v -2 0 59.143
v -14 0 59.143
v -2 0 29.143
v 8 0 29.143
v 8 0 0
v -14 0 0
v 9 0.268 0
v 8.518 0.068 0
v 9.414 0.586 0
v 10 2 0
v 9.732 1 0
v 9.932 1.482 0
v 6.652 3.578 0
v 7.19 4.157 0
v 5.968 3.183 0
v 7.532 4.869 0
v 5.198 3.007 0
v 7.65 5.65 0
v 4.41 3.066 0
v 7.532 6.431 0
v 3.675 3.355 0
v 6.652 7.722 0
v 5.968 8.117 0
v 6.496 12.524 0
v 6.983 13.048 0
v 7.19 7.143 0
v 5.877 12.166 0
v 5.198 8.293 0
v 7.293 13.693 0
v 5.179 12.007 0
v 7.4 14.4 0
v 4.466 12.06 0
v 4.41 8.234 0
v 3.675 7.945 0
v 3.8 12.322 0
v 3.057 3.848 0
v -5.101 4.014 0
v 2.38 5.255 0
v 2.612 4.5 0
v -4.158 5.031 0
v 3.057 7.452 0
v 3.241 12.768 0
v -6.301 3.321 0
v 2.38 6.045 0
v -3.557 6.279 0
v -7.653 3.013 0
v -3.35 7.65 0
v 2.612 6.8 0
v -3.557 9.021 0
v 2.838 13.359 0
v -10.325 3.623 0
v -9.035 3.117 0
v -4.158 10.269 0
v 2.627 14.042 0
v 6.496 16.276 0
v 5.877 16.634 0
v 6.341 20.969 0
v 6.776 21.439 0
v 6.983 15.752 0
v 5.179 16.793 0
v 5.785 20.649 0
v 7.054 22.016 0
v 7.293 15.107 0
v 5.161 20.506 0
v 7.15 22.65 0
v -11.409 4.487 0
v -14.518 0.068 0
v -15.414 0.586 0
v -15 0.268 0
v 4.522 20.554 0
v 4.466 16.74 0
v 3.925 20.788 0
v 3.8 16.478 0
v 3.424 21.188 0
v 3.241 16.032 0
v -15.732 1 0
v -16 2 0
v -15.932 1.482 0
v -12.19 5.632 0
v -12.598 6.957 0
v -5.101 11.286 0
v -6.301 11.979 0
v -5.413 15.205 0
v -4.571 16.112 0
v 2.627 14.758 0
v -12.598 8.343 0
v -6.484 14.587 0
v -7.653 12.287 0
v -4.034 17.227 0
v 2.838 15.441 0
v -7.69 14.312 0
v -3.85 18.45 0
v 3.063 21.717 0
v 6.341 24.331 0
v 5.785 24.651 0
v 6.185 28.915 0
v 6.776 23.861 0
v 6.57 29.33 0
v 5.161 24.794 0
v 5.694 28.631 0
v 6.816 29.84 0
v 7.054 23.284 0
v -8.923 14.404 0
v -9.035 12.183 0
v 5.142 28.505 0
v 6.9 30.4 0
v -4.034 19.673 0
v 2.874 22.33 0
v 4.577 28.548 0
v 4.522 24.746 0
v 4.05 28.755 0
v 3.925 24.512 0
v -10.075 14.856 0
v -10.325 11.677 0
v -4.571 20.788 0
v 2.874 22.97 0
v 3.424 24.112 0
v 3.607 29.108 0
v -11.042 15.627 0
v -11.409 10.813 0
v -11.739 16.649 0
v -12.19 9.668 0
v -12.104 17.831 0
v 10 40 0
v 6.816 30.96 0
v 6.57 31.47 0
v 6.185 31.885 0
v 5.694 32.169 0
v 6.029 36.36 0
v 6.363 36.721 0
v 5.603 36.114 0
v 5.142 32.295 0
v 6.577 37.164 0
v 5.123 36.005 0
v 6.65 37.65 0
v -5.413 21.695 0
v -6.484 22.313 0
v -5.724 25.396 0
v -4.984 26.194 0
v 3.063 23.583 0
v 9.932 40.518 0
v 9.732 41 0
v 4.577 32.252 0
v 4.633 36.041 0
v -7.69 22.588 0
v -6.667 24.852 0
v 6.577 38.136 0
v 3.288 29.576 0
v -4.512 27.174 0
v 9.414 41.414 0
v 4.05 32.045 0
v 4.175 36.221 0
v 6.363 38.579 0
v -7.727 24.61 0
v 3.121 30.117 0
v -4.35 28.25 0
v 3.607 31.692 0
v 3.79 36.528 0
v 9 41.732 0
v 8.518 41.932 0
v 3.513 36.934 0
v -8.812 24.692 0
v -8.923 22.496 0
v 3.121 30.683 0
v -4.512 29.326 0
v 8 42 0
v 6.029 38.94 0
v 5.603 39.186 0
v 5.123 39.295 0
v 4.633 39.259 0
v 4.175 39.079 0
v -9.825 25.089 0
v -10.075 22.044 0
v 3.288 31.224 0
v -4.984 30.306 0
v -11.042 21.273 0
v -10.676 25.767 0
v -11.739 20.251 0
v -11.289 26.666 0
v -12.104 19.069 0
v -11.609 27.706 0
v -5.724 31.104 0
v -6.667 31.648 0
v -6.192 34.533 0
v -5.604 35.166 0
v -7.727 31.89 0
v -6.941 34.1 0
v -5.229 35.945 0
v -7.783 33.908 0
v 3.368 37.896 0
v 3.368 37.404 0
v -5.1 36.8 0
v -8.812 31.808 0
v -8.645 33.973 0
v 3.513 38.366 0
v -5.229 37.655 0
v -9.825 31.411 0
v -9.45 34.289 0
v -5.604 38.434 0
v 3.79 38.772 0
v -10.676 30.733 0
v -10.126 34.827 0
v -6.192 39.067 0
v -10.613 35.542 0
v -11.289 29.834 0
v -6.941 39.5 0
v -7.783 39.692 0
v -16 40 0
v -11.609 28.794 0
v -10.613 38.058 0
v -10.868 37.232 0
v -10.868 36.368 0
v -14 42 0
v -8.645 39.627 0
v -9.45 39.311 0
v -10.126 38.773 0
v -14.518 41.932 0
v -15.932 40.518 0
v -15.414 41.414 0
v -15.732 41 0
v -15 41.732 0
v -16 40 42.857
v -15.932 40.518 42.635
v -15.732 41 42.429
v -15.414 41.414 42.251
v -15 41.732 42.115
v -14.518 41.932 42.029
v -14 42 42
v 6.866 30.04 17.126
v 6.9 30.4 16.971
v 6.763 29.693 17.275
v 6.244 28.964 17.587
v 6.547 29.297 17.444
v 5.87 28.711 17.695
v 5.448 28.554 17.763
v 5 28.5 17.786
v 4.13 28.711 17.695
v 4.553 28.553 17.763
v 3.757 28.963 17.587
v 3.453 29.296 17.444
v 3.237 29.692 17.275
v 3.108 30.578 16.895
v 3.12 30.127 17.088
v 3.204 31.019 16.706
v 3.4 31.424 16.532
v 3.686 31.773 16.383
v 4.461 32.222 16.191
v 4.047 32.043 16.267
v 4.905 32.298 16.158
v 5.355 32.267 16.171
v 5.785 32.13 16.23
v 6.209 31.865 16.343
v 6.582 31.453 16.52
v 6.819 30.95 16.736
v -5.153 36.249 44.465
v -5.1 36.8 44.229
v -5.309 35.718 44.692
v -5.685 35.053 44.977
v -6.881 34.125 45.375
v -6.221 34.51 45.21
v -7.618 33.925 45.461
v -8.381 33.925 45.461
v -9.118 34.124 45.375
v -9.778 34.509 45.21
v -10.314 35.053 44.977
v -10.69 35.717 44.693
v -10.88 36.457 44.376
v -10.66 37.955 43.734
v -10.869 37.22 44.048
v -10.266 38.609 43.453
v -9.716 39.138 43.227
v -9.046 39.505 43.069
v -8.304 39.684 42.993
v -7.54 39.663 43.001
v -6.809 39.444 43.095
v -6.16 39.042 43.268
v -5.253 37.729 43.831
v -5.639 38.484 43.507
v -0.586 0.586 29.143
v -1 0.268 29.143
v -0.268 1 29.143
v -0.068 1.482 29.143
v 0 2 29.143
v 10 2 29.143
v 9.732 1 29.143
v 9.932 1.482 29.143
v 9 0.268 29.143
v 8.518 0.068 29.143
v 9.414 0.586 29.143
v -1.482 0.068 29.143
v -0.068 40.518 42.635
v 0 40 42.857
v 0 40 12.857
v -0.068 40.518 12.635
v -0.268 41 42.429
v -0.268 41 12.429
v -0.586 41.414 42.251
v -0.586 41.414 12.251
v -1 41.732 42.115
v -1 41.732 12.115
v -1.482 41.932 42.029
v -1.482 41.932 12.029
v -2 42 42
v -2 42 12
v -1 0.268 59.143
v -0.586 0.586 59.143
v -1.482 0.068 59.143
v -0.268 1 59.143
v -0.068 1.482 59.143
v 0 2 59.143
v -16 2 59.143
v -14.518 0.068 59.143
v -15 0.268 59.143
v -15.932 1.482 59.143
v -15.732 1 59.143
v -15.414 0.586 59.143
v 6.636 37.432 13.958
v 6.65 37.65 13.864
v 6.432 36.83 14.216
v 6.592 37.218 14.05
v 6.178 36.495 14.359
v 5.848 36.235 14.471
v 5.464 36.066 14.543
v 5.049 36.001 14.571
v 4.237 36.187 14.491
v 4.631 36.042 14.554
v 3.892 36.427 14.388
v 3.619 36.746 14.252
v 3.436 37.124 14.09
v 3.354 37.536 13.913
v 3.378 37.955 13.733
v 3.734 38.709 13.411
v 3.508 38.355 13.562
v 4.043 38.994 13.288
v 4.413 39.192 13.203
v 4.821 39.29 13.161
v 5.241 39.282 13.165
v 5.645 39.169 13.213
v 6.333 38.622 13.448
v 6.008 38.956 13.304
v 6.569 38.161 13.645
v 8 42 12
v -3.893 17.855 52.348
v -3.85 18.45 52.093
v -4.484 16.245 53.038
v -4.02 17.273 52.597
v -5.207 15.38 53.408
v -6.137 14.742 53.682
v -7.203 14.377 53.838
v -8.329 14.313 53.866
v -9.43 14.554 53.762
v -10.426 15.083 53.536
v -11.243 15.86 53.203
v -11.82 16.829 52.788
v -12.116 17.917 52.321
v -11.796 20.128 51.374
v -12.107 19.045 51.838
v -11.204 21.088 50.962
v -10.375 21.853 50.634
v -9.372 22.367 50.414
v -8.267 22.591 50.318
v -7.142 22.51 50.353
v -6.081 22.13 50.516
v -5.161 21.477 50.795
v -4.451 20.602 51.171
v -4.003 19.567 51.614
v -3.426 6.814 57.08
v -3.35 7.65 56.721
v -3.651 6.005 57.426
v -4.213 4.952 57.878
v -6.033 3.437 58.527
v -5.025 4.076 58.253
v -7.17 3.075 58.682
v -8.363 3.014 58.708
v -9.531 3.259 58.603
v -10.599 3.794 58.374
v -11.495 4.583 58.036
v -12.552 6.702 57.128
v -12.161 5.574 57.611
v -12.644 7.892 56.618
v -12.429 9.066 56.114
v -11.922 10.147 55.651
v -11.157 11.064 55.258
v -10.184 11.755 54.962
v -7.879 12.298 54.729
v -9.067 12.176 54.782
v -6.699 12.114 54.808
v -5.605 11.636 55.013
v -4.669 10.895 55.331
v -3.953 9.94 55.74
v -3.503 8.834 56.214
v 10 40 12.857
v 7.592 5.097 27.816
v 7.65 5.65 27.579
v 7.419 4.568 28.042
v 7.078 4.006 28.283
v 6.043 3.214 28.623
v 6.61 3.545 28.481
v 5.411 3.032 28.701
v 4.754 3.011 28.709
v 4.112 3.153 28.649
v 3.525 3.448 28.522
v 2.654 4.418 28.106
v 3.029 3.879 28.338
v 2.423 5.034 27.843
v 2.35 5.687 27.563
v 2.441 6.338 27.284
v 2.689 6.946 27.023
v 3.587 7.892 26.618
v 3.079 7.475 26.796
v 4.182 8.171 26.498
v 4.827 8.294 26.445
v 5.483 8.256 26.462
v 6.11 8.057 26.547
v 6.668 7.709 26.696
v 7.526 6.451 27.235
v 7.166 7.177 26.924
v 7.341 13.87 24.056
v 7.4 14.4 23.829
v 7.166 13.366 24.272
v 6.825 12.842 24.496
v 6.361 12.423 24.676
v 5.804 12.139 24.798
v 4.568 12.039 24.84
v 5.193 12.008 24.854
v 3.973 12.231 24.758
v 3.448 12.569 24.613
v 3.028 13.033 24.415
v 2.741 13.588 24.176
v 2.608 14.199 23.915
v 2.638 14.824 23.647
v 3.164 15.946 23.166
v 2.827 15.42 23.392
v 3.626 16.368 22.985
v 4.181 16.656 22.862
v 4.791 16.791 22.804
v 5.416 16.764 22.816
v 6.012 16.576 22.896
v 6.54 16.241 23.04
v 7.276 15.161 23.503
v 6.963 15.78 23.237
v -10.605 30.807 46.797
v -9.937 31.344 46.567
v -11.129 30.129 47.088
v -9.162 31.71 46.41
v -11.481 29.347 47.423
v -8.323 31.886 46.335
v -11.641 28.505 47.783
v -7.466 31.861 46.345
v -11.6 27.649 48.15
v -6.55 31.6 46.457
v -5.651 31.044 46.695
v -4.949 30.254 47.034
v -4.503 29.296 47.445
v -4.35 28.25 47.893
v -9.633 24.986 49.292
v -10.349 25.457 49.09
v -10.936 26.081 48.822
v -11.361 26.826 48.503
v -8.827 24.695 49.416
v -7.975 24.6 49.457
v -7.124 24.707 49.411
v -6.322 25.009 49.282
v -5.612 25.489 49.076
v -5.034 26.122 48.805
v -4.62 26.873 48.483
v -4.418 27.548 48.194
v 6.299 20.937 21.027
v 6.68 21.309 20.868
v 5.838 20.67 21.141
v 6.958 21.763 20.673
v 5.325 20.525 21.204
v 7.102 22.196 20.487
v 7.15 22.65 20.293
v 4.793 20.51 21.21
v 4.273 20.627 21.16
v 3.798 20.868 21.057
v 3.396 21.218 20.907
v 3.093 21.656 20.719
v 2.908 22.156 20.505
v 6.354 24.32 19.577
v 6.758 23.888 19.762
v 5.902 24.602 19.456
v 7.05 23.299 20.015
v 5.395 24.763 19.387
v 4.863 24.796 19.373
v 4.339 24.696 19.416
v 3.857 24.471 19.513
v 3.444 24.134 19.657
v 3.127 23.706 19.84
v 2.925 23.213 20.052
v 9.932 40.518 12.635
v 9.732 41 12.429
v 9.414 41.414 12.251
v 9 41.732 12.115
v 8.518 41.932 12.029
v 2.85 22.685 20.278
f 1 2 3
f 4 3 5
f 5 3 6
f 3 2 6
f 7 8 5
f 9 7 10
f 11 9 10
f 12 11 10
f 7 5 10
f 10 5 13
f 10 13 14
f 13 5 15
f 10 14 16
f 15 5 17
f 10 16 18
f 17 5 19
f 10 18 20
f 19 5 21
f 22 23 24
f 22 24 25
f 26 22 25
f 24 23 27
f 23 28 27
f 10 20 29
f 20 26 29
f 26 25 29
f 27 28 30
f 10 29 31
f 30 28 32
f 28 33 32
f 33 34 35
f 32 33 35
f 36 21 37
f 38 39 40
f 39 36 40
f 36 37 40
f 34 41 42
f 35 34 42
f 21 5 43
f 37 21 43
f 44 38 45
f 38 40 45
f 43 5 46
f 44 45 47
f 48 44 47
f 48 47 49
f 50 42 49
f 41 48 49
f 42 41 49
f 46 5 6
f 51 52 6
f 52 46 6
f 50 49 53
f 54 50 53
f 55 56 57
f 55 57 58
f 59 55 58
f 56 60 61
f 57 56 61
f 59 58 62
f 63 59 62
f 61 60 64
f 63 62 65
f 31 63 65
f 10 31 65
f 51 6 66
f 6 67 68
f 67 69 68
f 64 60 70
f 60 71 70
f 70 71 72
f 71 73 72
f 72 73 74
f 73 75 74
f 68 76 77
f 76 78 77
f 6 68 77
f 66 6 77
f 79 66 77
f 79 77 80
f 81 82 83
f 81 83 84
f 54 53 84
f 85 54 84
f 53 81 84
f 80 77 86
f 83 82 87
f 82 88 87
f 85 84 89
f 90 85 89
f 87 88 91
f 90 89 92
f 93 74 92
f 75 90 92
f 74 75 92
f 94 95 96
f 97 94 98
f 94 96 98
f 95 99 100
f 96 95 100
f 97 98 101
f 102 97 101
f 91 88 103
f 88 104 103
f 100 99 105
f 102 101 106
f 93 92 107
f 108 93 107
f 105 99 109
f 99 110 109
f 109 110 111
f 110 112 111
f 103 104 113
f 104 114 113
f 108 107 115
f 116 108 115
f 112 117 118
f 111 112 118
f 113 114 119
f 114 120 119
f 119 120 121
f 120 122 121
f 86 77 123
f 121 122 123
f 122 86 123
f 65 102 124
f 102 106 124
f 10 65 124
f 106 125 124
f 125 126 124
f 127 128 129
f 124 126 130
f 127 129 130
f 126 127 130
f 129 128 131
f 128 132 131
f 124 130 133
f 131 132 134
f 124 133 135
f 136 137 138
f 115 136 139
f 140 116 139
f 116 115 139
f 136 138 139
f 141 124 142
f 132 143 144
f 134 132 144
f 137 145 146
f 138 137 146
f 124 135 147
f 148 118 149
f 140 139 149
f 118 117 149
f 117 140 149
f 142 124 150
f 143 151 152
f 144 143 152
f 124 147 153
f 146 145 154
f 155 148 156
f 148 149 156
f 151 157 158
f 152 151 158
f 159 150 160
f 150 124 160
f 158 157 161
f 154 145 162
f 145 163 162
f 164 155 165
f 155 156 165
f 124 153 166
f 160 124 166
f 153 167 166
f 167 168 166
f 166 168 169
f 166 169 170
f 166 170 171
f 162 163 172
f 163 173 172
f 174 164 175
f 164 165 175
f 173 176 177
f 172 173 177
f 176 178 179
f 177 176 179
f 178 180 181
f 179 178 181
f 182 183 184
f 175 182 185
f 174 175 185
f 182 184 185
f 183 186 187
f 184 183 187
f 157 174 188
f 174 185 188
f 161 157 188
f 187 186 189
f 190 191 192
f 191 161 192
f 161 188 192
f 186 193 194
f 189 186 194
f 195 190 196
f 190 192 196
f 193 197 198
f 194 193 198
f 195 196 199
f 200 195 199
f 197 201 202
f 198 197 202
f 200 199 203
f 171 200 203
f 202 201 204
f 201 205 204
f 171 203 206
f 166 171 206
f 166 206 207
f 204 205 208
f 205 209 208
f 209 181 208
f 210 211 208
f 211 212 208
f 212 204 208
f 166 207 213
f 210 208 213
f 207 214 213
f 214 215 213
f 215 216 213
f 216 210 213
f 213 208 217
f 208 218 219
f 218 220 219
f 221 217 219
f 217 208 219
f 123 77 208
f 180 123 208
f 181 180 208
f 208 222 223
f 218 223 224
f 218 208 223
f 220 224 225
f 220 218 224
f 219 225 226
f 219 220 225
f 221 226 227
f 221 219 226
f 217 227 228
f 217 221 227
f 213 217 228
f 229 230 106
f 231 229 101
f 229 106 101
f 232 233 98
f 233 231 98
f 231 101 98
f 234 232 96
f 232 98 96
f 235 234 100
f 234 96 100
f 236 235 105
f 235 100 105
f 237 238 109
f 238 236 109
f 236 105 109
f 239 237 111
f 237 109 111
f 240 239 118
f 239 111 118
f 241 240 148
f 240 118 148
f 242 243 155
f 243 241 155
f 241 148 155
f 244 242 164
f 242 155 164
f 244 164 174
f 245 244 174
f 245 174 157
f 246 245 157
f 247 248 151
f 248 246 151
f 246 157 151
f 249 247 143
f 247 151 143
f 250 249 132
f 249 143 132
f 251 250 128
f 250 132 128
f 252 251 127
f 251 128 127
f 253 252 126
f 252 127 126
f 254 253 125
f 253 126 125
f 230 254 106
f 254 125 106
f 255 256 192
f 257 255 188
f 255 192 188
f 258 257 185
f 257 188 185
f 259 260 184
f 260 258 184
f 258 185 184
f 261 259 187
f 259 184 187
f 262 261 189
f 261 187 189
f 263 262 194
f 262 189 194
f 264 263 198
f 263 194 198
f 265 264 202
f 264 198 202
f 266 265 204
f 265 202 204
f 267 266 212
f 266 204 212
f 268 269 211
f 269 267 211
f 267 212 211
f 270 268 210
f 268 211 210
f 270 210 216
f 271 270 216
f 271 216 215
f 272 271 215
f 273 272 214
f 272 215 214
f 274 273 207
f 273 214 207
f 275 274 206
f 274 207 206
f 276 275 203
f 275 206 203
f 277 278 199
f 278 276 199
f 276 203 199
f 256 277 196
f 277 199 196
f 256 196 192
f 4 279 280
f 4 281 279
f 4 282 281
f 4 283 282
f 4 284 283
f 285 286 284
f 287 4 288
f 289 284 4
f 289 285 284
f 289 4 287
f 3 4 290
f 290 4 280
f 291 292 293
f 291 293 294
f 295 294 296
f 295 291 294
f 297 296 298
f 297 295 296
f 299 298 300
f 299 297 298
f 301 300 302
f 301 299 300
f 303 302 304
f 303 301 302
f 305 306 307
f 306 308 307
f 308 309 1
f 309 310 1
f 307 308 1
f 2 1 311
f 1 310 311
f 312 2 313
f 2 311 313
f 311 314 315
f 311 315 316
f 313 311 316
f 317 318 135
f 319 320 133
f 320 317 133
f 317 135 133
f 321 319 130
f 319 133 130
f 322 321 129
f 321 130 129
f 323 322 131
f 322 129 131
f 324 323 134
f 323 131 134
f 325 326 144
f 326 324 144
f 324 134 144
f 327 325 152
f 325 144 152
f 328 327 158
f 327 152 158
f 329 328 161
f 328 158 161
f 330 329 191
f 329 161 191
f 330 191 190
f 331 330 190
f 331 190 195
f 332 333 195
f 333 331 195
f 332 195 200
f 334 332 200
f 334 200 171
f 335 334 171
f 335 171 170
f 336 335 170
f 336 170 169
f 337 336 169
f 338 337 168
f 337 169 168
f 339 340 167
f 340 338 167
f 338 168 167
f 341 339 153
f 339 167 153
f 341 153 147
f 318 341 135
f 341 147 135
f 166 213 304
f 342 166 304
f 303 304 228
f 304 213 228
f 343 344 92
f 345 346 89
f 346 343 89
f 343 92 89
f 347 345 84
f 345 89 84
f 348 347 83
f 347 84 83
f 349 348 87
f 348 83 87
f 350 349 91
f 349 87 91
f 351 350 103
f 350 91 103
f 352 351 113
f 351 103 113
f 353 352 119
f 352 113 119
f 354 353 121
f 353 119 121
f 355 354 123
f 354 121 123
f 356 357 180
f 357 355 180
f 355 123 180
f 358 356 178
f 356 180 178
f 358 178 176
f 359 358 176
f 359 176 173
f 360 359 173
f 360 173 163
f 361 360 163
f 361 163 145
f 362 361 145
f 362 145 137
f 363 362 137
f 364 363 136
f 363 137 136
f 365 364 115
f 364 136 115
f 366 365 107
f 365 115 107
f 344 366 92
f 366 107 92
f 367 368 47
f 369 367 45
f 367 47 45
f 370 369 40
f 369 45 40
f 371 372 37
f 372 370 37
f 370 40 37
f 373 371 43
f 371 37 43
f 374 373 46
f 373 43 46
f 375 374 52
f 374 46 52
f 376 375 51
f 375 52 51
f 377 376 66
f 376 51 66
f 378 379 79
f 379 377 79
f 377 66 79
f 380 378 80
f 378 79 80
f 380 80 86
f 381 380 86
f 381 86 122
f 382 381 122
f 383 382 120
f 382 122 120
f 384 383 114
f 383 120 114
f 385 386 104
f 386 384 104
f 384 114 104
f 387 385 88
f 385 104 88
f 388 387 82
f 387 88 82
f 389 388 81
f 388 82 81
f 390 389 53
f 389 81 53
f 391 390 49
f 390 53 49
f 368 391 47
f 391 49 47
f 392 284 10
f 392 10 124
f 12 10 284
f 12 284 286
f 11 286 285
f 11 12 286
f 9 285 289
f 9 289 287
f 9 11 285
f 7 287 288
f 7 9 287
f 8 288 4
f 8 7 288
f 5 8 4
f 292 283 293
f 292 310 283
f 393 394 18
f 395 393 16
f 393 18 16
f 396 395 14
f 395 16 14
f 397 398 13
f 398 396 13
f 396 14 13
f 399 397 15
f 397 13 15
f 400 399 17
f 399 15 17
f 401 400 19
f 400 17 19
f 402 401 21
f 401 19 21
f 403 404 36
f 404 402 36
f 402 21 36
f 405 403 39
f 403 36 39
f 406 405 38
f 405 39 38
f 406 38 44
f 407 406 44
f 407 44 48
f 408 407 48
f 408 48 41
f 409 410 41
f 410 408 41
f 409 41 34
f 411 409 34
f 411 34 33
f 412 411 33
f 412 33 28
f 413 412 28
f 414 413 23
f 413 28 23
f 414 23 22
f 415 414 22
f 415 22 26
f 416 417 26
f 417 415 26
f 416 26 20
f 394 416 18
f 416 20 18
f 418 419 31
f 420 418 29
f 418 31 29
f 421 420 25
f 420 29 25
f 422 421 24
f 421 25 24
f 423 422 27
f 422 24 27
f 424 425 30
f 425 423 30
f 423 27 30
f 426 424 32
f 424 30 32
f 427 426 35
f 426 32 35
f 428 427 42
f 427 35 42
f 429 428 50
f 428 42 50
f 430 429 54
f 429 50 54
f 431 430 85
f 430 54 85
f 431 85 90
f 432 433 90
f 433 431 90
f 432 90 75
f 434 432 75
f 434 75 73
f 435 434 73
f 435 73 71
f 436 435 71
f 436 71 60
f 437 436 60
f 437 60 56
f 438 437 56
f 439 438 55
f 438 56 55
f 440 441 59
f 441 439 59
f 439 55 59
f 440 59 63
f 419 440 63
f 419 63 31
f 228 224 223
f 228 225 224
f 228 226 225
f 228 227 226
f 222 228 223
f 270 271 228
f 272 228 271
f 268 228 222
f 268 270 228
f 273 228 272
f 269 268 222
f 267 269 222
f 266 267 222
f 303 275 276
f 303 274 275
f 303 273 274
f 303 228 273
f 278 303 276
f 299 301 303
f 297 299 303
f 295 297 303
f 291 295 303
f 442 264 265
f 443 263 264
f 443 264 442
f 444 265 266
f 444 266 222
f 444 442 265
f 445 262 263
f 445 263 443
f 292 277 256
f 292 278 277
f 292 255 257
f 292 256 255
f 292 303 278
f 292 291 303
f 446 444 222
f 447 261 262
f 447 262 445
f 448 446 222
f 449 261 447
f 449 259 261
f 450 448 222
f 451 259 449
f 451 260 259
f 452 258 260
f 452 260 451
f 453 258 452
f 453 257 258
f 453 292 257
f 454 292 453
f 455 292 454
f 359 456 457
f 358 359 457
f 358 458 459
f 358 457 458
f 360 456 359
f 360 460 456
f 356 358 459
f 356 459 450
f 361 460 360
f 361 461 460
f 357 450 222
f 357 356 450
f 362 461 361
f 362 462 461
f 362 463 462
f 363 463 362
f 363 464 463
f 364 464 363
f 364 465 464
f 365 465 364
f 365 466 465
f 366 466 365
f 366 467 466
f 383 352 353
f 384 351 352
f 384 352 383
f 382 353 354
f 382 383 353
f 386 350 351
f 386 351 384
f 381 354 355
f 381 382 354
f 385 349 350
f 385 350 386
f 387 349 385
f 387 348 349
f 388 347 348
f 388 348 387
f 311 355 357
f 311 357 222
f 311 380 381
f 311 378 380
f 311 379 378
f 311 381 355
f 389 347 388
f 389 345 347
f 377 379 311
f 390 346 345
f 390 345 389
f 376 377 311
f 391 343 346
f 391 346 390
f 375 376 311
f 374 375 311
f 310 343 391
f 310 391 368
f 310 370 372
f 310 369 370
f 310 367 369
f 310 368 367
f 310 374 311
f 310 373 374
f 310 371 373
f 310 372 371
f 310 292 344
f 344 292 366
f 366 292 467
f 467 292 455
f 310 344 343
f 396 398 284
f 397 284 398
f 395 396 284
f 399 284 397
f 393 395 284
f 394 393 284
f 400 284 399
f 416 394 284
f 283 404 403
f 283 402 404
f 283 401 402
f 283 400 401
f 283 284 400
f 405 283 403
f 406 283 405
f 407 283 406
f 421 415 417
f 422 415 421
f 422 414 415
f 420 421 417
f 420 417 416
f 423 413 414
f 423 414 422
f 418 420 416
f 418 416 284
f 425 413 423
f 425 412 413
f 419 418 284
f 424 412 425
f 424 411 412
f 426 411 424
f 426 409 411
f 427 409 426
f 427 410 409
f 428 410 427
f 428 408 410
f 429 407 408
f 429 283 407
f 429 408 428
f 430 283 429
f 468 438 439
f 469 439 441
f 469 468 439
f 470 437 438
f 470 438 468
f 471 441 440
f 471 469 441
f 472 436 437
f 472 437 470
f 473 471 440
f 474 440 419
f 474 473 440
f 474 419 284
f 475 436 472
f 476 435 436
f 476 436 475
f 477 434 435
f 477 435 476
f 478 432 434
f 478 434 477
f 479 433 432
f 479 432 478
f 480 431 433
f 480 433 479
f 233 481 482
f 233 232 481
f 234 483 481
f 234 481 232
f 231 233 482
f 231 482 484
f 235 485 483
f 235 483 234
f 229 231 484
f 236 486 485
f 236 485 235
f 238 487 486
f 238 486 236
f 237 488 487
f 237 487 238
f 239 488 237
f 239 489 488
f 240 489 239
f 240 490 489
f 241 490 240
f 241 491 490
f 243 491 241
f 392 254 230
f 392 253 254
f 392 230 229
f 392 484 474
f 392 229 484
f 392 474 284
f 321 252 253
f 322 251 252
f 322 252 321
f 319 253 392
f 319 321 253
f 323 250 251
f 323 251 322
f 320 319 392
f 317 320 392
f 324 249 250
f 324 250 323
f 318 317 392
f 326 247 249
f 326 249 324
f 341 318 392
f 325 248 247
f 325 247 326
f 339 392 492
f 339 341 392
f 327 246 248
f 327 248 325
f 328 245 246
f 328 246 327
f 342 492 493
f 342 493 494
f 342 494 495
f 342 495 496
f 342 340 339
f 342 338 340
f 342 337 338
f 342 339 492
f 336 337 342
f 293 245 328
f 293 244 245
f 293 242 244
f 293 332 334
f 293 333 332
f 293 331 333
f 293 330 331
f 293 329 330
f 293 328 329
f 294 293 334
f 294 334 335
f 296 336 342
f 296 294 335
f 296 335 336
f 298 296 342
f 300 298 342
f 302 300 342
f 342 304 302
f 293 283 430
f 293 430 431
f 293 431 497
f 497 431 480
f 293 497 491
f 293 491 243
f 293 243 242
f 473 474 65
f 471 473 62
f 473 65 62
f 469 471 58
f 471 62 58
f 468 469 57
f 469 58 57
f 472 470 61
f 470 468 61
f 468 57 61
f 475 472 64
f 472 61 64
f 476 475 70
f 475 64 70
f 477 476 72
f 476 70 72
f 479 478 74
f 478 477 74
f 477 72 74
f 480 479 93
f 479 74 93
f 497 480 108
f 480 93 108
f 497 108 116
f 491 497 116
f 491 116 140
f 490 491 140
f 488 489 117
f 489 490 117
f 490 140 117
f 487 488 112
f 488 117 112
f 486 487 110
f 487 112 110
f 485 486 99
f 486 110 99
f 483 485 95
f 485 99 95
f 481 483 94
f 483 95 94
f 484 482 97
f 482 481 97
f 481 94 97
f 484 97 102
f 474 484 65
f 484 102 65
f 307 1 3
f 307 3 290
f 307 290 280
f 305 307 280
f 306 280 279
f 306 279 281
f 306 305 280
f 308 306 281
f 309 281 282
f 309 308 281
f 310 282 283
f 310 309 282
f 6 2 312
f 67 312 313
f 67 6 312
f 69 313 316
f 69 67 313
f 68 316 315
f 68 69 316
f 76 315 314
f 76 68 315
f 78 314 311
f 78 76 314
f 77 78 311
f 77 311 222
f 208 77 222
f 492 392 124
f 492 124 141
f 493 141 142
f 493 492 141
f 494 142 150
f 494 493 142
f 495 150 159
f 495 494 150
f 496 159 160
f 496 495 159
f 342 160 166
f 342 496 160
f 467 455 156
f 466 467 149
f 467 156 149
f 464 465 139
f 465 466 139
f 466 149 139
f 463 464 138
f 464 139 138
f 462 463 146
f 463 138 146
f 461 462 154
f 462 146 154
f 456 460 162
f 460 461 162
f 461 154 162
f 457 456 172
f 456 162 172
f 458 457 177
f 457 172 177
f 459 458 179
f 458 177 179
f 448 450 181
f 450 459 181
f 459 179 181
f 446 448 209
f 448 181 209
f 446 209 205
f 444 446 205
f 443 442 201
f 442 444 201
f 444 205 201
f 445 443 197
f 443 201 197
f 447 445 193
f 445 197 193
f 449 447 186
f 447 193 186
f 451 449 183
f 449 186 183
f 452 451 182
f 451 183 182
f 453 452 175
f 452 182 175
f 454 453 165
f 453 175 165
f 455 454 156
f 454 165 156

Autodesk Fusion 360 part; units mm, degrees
sketch "Base Profile" plane through (0, 0, 0) normal (1, 0, 0) x (0, 1, 0)
  line L0 (0, 0) -> (42, 0)
  line L1 (42, 0) -> (42, 42)
  line L2 (42, 42) -> (0, 60)
  line L3 (0, 60) -> (0, 0)
  line L4 (0, 30) -> (42, 12)
  dimension "d1" = 42
  dimension "d2" = 60
  dimension "d3" = 42
  dimension "d4" = 30
extrude "Extrude1" add sketch "Base Profile" against normal blind 16
extrude "Extrude2" add sketch "Base Profile" along normal blind 10 contours L0 L1 L3 L4
sketch "Hole Layouts" plane through (0, 0, 0) normal (0, 0, 1) x (1, 0, 0)
  line L0 (0, 42) -> (0, 0)
  line L1 (0, 0) -> (10, 0)
  line L2 (10, 0) -> (10, 42)
  line L3 (10, 42) -> (0, 42)
  line L4 (0, 0) -> (0, 42)
  line L5 (0, 42) -> (-16, 42)
  line L6 (-16, 42) -> (-16, 0)
  line L7 (-16, 0) -> (0, 0)
  circle A0 centre (-8, 7.65) radius 4.65
  circle A1 centre (-8, 18.45) radius 4.15
  circle A2 centre (-8, 28.25) radius 3.65
  circle A3 centre (-8, 36.8) radius 2.9
  line L8 (5, 0) -> (5, 42) construction
  circle A4 centre (5, 5.65) radius 2.65
  circle A5 centre (5, 14.4) radius 2.4
  circle A6 centre (5, 22.65) radius 2.15
  circle A7 centre (5, 30.4) radius 1.9
  circle A8 centre (5, 37.65) radius 1.65
  line L9 (-8, 0) -> (-8, 42) construction
  dimension "d10" = 9.3
  dimension "d11" = 8.3
  dimension "d12" = 7.3
  dimension "d13" = 5.8
  dimension "d15" = 2
  dimension "d16" = 2
  dimension "d17" = 2
  dimension "d19" = 3
  dimension "d20" = 2.3
  dimension "d21" = 5.3
  dimension "d22" = 4.8
  dimension "d23" = 4.3
  dimension "d24" = 3.8
  dimension "d25" = 3.3
  dimension "d26" = 3.7
  dimension "d27" = 3.7
  dimension "d29" = 3.7
  dimension "d30" = 3.7
  dimension "d32" = 2.7
  dimension "d33" = 3
extrude "Extrude3" cut sketch "Hole Layouts" along normal through all contours A0 | A1 | A2 | A3 | A4 | A5 | A6 | A7 | A8
fillet "Fillet1" radius 2 5 edges at (0, 42, 27) (10, 42, 6) (10, 0, 15) (-16, 42, 21) (-16, 0, 30)
sketch "Clipping corners for Printing" plane through (-16, 0, 0) normal (-1, 0, 0) x (0, -1, 0)
  line L0 (-2, 0) -> (-2, 59.1429)
  line L1 (-2, 59.1429) -> (-40, 42.8571)
  line L2 (-40, 42.8571) -> (-40, 0)
  line L3 (-40, 0) -> (-2, 0)
  line L4 (-42, 42) -> (0, 60)
  line L5 (0, 60) -> (0, 0)
  line L6 (-2, 59.1429) -> (0, 59.1429)
  line L7 (-2, 59.1429) -> (-40, 42.8571)
  line L8 (0, 30) -> (-42, 12)
  line L9 (-2, 0) -> (-2, 29.1429)
  line L10 (-2, 29.1429) -> (0, 29.1429)
  point P0 (-3, 58.7143)
extrude "Extrude4" cut sketch "Clipping corners for Printing" against normal through all contours L4 L5 L6
extrude "Extrude5" cut sketch "Clipping corners for Printing" along normal up to surface (10 mm away) from surface at -26 contours L5 L8 L10
fillet "Fillet2" radius 2 1 edges at (0, 0, 44.1429)
equation "d10 = 9 mm + SlipFitTolerance"
equation "d11 = 8 mm + SlipFitTolerance"
equation "d12 = 7 mm + SlipFitTolerance"
equation "d13 = 5.5 mm + SlipFitTolerance"
equation "d16 = d15"
equation "d17 = d15"
equation "d21 = 5 mm + SlipFitTolerance"
equation "d22 = 4.5 mm + SlipFitTolerance"
equation "d23 = 4 mm + SlipFitTolerance"
equation "d24 = 3.5 mm + SlipFitTolerance"
equation "d25 = 3 mm + SlipFitTolerance"
equation "d27 = d26"
equation "d29 = d26"
equation "d30 = d26"
equation "SlipFitTolerance = 0.3 mm"
